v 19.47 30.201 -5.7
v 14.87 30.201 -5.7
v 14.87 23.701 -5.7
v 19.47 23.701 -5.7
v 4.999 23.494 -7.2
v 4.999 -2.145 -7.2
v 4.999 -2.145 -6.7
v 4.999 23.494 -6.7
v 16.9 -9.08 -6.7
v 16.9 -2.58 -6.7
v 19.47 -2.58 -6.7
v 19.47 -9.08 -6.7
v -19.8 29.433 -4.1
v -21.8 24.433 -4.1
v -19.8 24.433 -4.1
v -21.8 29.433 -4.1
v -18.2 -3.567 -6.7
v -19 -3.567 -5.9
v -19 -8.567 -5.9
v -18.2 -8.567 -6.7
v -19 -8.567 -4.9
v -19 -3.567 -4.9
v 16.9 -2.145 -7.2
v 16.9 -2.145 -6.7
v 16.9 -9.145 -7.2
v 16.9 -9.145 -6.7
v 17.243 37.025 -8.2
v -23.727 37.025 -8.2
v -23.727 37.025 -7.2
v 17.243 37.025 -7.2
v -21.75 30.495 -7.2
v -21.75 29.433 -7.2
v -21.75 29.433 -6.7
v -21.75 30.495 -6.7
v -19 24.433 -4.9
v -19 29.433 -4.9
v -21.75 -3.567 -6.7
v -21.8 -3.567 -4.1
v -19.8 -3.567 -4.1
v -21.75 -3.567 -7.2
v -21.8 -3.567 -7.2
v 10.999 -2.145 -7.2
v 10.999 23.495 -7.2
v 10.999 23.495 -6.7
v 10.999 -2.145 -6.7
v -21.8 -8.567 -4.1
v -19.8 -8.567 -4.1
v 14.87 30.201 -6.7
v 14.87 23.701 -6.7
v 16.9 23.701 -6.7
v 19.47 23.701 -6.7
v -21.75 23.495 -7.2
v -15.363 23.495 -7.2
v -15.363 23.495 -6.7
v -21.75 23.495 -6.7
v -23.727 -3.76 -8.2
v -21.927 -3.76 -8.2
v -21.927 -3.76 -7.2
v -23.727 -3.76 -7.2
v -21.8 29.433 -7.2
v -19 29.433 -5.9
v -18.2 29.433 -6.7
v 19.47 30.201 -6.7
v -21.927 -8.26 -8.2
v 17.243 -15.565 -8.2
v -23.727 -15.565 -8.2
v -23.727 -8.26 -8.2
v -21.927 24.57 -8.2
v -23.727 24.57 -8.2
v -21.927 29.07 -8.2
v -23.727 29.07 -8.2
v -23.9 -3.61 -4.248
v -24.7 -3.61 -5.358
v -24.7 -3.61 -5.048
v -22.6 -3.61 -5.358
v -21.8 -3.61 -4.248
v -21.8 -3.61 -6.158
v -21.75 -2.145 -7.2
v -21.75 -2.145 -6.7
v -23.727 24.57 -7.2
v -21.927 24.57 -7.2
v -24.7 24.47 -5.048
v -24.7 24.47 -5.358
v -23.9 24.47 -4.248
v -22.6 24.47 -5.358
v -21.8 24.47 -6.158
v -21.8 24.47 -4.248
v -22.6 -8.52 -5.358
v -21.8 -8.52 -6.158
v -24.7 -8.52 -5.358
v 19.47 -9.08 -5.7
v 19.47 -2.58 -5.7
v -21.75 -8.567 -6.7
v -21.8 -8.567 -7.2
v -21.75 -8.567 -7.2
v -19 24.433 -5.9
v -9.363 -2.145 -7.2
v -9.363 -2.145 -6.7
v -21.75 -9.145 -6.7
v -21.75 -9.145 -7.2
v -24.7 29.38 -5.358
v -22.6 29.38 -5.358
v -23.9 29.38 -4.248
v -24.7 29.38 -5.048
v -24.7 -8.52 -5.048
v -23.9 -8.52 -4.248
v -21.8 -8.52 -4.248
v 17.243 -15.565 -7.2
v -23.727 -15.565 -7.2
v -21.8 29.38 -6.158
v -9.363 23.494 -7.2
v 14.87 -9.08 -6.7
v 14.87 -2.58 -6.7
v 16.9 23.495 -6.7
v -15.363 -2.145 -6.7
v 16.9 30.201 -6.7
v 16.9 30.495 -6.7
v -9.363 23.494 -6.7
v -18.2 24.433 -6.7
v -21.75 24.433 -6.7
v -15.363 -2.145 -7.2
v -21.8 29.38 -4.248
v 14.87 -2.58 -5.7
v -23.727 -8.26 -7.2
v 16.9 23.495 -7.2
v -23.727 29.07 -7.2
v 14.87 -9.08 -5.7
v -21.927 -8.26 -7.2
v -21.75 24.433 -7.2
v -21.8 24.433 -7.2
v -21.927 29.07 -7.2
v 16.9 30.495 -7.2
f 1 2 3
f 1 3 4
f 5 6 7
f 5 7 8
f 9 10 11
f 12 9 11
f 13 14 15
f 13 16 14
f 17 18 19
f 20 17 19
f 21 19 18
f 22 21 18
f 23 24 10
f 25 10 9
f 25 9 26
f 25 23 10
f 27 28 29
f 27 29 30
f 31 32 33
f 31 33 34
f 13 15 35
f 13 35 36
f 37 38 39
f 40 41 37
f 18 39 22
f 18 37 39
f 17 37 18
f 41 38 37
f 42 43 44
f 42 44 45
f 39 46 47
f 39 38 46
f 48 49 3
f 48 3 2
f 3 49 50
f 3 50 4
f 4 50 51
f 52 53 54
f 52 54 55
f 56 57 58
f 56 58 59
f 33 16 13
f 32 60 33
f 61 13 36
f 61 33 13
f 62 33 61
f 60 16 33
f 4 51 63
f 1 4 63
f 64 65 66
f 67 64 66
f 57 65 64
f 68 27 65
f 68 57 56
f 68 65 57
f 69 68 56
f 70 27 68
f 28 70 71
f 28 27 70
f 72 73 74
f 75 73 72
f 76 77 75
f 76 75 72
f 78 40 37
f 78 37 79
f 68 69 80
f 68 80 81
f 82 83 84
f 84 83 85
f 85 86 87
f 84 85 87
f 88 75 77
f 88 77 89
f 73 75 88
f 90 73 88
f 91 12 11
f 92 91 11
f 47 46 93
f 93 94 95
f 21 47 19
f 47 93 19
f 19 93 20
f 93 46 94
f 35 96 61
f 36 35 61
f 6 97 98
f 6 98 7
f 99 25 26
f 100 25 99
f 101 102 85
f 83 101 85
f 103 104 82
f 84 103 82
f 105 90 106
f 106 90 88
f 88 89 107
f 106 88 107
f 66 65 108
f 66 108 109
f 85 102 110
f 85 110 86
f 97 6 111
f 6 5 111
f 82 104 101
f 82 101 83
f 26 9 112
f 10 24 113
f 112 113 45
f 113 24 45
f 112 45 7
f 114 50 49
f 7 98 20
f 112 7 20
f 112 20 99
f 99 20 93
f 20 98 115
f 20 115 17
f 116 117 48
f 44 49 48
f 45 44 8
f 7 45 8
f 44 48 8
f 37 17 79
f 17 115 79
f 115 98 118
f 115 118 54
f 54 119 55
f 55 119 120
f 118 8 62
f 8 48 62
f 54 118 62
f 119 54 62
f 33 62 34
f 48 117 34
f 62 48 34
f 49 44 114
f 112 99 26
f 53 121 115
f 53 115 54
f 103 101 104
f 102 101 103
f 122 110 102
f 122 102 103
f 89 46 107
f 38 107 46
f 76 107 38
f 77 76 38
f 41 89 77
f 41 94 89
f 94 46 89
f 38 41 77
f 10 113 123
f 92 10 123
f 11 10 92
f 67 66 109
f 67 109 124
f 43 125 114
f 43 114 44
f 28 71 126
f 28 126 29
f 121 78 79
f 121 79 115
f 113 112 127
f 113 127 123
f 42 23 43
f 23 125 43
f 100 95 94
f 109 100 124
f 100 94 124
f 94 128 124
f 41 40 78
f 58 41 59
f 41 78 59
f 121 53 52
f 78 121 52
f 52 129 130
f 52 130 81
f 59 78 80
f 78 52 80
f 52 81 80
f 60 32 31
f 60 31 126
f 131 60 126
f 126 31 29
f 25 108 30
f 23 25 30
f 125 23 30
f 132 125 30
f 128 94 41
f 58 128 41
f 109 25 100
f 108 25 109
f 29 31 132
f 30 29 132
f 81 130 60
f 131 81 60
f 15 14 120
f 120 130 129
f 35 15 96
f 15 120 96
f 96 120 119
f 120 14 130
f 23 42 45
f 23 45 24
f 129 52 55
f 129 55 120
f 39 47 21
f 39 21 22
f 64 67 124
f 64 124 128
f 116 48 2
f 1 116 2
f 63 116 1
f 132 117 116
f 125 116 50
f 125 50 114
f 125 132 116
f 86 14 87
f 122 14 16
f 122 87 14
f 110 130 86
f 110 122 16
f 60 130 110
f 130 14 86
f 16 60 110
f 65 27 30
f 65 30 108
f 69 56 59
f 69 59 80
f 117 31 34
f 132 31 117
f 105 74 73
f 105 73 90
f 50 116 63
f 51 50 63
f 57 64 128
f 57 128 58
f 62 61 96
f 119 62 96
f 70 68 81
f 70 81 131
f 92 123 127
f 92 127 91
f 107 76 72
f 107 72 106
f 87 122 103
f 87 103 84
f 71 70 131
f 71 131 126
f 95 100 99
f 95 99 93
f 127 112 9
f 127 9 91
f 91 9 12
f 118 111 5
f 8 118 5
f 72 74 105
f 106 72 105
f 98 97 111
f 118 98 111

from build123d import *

# Parameters (mm, degrees)
PAD012_DEPTH    = 1
SKETCH027_W     = 2.8
SKETCH027_H     = 5
PAD013_DEPTH    = 3.1
SKETCH028_W     = 14.36185
SKETCH028_H     = 25.638802
PAD014_DEPTH    = 0.5
SKETCH029_W     = 4.6
SKETCH029_H     = 6.5
PAD015_DEPTH    = 1
SKETCH030_W     = 4.91
SKETCH030_H     = 1.11
PAD016_DEPTH    = 2.9
CHAMFER003_SIZE = 0.8


with BuildPart() as part:
    # Sketch026 → Pad012 (new body)
    with BuildSketch(Plane.XY.offset(-6.5)):
        Polygon((-24.727272, 35.025402), (16.242728, 35.025402), (16.242728, -17.564598), (-24.727272, -17.564598), (-24.727272, -10.26), (-22.927272, -10.26), (-22.927272, -5.76), (-24.727272, -5.76), (-24.727272, 22.57), (-22.927272, 22.57), (-22.927272, 27.07), (-24.727272, 27.07), align=None)
    extrude(amount=PAD012_DEPTH)

    # Sketch027 (on Face14 of Pad012) → Pad013 (join)
    with BuildSketch(Plane.XY.offset(-5.5)):
        with Locations((-21.4, -8.066671)):
            Rectangle(SKETCH027_W, SKETCH027_H)
        with Locations((-21.4, 24.933329)):
            Rectangle(SKETCH027_W, SKETCH027_H)
    extrude(amount=PAD013_DEPTH)

    # Sketch028 (on Face5 of Pad013) → Pad014 (join)
    with BuildSketch(Plane.XY.offset(-5.5)):
        Polygon((15.9, -11.144853), (-22.75, -11.144853), (-22.75, -4.144854), (-16.362574, -4.144854), (-16.362574, 21.495147), (-22.75, 21.495147), (-22.75, 28.495147), (15.9, 28.495147), (15.9, 21.495148), (9.999276, 21.495148), (9.999276, -4.144854), (15.9, -4.144854), align=None)
        with Locations((-3.181649, 8.674547)):
            Rectangle(SKETCH028_W, SKETCH028_H, mode=Mode.SUBTRACT)
    extrude(amount=PAD014_DEPTH)

    # Sketch029 (on Face35 of Pad014) → Pad015 (join)
    with BuildSketch(Plane.XY.offset(-5)):
        with Locations((16.17, 24.951215)):
            Rectangle(SKETCH029_W, SKETCH029_H)
        with Locations((16.17, -7.83)):
            Rectangle(SKETCH029_W, SKETCH029_H)
    extrude(amount=PAD015_DEPTH)

    # Sketch030 (on Face34 of Pad015) → Pad016 (join)
    with BuildSketch(Plane(origin=(-22.8, 0, 0), x_dir=(0, -1, 0), z_dir=(-1, 0, 0))):
        with Locations((-24.925, -3.103053)):
            Rectangle(SKETCH030_W, SKETCH030_H)
        with Locations((8.065, -3.103053)):
            Rectangle(SKETCH030_W, SKETCH030_H)
    extrude(amount=PAD016_DEPTH)

    # Chamfer003
    chamfer003_edges = [part.edges().sort_by_distance(p)[0] for p in [
        (-25.7, 24.925, -2.548053),
        (-25.7, -8.065, -2.548053),
        (-20, 24.933329, -2.4),
        (-20, -8.066671, -2.4),
        (-20, 24.933329, -5),
        (-20, -8.066671, -5),
        (-22.8, -8.065, -3.658053),
        (-22.8, 24.925, -3.658053),
    ]]
    chamfer(chamfer003_edges, length=CHAMFER003_SIZE)


with BuildPart() as part_1:
    # Body005 placement: moved
    add(part.part.moved(Location((1, 2, -1.7))))


solid = part_1.part
